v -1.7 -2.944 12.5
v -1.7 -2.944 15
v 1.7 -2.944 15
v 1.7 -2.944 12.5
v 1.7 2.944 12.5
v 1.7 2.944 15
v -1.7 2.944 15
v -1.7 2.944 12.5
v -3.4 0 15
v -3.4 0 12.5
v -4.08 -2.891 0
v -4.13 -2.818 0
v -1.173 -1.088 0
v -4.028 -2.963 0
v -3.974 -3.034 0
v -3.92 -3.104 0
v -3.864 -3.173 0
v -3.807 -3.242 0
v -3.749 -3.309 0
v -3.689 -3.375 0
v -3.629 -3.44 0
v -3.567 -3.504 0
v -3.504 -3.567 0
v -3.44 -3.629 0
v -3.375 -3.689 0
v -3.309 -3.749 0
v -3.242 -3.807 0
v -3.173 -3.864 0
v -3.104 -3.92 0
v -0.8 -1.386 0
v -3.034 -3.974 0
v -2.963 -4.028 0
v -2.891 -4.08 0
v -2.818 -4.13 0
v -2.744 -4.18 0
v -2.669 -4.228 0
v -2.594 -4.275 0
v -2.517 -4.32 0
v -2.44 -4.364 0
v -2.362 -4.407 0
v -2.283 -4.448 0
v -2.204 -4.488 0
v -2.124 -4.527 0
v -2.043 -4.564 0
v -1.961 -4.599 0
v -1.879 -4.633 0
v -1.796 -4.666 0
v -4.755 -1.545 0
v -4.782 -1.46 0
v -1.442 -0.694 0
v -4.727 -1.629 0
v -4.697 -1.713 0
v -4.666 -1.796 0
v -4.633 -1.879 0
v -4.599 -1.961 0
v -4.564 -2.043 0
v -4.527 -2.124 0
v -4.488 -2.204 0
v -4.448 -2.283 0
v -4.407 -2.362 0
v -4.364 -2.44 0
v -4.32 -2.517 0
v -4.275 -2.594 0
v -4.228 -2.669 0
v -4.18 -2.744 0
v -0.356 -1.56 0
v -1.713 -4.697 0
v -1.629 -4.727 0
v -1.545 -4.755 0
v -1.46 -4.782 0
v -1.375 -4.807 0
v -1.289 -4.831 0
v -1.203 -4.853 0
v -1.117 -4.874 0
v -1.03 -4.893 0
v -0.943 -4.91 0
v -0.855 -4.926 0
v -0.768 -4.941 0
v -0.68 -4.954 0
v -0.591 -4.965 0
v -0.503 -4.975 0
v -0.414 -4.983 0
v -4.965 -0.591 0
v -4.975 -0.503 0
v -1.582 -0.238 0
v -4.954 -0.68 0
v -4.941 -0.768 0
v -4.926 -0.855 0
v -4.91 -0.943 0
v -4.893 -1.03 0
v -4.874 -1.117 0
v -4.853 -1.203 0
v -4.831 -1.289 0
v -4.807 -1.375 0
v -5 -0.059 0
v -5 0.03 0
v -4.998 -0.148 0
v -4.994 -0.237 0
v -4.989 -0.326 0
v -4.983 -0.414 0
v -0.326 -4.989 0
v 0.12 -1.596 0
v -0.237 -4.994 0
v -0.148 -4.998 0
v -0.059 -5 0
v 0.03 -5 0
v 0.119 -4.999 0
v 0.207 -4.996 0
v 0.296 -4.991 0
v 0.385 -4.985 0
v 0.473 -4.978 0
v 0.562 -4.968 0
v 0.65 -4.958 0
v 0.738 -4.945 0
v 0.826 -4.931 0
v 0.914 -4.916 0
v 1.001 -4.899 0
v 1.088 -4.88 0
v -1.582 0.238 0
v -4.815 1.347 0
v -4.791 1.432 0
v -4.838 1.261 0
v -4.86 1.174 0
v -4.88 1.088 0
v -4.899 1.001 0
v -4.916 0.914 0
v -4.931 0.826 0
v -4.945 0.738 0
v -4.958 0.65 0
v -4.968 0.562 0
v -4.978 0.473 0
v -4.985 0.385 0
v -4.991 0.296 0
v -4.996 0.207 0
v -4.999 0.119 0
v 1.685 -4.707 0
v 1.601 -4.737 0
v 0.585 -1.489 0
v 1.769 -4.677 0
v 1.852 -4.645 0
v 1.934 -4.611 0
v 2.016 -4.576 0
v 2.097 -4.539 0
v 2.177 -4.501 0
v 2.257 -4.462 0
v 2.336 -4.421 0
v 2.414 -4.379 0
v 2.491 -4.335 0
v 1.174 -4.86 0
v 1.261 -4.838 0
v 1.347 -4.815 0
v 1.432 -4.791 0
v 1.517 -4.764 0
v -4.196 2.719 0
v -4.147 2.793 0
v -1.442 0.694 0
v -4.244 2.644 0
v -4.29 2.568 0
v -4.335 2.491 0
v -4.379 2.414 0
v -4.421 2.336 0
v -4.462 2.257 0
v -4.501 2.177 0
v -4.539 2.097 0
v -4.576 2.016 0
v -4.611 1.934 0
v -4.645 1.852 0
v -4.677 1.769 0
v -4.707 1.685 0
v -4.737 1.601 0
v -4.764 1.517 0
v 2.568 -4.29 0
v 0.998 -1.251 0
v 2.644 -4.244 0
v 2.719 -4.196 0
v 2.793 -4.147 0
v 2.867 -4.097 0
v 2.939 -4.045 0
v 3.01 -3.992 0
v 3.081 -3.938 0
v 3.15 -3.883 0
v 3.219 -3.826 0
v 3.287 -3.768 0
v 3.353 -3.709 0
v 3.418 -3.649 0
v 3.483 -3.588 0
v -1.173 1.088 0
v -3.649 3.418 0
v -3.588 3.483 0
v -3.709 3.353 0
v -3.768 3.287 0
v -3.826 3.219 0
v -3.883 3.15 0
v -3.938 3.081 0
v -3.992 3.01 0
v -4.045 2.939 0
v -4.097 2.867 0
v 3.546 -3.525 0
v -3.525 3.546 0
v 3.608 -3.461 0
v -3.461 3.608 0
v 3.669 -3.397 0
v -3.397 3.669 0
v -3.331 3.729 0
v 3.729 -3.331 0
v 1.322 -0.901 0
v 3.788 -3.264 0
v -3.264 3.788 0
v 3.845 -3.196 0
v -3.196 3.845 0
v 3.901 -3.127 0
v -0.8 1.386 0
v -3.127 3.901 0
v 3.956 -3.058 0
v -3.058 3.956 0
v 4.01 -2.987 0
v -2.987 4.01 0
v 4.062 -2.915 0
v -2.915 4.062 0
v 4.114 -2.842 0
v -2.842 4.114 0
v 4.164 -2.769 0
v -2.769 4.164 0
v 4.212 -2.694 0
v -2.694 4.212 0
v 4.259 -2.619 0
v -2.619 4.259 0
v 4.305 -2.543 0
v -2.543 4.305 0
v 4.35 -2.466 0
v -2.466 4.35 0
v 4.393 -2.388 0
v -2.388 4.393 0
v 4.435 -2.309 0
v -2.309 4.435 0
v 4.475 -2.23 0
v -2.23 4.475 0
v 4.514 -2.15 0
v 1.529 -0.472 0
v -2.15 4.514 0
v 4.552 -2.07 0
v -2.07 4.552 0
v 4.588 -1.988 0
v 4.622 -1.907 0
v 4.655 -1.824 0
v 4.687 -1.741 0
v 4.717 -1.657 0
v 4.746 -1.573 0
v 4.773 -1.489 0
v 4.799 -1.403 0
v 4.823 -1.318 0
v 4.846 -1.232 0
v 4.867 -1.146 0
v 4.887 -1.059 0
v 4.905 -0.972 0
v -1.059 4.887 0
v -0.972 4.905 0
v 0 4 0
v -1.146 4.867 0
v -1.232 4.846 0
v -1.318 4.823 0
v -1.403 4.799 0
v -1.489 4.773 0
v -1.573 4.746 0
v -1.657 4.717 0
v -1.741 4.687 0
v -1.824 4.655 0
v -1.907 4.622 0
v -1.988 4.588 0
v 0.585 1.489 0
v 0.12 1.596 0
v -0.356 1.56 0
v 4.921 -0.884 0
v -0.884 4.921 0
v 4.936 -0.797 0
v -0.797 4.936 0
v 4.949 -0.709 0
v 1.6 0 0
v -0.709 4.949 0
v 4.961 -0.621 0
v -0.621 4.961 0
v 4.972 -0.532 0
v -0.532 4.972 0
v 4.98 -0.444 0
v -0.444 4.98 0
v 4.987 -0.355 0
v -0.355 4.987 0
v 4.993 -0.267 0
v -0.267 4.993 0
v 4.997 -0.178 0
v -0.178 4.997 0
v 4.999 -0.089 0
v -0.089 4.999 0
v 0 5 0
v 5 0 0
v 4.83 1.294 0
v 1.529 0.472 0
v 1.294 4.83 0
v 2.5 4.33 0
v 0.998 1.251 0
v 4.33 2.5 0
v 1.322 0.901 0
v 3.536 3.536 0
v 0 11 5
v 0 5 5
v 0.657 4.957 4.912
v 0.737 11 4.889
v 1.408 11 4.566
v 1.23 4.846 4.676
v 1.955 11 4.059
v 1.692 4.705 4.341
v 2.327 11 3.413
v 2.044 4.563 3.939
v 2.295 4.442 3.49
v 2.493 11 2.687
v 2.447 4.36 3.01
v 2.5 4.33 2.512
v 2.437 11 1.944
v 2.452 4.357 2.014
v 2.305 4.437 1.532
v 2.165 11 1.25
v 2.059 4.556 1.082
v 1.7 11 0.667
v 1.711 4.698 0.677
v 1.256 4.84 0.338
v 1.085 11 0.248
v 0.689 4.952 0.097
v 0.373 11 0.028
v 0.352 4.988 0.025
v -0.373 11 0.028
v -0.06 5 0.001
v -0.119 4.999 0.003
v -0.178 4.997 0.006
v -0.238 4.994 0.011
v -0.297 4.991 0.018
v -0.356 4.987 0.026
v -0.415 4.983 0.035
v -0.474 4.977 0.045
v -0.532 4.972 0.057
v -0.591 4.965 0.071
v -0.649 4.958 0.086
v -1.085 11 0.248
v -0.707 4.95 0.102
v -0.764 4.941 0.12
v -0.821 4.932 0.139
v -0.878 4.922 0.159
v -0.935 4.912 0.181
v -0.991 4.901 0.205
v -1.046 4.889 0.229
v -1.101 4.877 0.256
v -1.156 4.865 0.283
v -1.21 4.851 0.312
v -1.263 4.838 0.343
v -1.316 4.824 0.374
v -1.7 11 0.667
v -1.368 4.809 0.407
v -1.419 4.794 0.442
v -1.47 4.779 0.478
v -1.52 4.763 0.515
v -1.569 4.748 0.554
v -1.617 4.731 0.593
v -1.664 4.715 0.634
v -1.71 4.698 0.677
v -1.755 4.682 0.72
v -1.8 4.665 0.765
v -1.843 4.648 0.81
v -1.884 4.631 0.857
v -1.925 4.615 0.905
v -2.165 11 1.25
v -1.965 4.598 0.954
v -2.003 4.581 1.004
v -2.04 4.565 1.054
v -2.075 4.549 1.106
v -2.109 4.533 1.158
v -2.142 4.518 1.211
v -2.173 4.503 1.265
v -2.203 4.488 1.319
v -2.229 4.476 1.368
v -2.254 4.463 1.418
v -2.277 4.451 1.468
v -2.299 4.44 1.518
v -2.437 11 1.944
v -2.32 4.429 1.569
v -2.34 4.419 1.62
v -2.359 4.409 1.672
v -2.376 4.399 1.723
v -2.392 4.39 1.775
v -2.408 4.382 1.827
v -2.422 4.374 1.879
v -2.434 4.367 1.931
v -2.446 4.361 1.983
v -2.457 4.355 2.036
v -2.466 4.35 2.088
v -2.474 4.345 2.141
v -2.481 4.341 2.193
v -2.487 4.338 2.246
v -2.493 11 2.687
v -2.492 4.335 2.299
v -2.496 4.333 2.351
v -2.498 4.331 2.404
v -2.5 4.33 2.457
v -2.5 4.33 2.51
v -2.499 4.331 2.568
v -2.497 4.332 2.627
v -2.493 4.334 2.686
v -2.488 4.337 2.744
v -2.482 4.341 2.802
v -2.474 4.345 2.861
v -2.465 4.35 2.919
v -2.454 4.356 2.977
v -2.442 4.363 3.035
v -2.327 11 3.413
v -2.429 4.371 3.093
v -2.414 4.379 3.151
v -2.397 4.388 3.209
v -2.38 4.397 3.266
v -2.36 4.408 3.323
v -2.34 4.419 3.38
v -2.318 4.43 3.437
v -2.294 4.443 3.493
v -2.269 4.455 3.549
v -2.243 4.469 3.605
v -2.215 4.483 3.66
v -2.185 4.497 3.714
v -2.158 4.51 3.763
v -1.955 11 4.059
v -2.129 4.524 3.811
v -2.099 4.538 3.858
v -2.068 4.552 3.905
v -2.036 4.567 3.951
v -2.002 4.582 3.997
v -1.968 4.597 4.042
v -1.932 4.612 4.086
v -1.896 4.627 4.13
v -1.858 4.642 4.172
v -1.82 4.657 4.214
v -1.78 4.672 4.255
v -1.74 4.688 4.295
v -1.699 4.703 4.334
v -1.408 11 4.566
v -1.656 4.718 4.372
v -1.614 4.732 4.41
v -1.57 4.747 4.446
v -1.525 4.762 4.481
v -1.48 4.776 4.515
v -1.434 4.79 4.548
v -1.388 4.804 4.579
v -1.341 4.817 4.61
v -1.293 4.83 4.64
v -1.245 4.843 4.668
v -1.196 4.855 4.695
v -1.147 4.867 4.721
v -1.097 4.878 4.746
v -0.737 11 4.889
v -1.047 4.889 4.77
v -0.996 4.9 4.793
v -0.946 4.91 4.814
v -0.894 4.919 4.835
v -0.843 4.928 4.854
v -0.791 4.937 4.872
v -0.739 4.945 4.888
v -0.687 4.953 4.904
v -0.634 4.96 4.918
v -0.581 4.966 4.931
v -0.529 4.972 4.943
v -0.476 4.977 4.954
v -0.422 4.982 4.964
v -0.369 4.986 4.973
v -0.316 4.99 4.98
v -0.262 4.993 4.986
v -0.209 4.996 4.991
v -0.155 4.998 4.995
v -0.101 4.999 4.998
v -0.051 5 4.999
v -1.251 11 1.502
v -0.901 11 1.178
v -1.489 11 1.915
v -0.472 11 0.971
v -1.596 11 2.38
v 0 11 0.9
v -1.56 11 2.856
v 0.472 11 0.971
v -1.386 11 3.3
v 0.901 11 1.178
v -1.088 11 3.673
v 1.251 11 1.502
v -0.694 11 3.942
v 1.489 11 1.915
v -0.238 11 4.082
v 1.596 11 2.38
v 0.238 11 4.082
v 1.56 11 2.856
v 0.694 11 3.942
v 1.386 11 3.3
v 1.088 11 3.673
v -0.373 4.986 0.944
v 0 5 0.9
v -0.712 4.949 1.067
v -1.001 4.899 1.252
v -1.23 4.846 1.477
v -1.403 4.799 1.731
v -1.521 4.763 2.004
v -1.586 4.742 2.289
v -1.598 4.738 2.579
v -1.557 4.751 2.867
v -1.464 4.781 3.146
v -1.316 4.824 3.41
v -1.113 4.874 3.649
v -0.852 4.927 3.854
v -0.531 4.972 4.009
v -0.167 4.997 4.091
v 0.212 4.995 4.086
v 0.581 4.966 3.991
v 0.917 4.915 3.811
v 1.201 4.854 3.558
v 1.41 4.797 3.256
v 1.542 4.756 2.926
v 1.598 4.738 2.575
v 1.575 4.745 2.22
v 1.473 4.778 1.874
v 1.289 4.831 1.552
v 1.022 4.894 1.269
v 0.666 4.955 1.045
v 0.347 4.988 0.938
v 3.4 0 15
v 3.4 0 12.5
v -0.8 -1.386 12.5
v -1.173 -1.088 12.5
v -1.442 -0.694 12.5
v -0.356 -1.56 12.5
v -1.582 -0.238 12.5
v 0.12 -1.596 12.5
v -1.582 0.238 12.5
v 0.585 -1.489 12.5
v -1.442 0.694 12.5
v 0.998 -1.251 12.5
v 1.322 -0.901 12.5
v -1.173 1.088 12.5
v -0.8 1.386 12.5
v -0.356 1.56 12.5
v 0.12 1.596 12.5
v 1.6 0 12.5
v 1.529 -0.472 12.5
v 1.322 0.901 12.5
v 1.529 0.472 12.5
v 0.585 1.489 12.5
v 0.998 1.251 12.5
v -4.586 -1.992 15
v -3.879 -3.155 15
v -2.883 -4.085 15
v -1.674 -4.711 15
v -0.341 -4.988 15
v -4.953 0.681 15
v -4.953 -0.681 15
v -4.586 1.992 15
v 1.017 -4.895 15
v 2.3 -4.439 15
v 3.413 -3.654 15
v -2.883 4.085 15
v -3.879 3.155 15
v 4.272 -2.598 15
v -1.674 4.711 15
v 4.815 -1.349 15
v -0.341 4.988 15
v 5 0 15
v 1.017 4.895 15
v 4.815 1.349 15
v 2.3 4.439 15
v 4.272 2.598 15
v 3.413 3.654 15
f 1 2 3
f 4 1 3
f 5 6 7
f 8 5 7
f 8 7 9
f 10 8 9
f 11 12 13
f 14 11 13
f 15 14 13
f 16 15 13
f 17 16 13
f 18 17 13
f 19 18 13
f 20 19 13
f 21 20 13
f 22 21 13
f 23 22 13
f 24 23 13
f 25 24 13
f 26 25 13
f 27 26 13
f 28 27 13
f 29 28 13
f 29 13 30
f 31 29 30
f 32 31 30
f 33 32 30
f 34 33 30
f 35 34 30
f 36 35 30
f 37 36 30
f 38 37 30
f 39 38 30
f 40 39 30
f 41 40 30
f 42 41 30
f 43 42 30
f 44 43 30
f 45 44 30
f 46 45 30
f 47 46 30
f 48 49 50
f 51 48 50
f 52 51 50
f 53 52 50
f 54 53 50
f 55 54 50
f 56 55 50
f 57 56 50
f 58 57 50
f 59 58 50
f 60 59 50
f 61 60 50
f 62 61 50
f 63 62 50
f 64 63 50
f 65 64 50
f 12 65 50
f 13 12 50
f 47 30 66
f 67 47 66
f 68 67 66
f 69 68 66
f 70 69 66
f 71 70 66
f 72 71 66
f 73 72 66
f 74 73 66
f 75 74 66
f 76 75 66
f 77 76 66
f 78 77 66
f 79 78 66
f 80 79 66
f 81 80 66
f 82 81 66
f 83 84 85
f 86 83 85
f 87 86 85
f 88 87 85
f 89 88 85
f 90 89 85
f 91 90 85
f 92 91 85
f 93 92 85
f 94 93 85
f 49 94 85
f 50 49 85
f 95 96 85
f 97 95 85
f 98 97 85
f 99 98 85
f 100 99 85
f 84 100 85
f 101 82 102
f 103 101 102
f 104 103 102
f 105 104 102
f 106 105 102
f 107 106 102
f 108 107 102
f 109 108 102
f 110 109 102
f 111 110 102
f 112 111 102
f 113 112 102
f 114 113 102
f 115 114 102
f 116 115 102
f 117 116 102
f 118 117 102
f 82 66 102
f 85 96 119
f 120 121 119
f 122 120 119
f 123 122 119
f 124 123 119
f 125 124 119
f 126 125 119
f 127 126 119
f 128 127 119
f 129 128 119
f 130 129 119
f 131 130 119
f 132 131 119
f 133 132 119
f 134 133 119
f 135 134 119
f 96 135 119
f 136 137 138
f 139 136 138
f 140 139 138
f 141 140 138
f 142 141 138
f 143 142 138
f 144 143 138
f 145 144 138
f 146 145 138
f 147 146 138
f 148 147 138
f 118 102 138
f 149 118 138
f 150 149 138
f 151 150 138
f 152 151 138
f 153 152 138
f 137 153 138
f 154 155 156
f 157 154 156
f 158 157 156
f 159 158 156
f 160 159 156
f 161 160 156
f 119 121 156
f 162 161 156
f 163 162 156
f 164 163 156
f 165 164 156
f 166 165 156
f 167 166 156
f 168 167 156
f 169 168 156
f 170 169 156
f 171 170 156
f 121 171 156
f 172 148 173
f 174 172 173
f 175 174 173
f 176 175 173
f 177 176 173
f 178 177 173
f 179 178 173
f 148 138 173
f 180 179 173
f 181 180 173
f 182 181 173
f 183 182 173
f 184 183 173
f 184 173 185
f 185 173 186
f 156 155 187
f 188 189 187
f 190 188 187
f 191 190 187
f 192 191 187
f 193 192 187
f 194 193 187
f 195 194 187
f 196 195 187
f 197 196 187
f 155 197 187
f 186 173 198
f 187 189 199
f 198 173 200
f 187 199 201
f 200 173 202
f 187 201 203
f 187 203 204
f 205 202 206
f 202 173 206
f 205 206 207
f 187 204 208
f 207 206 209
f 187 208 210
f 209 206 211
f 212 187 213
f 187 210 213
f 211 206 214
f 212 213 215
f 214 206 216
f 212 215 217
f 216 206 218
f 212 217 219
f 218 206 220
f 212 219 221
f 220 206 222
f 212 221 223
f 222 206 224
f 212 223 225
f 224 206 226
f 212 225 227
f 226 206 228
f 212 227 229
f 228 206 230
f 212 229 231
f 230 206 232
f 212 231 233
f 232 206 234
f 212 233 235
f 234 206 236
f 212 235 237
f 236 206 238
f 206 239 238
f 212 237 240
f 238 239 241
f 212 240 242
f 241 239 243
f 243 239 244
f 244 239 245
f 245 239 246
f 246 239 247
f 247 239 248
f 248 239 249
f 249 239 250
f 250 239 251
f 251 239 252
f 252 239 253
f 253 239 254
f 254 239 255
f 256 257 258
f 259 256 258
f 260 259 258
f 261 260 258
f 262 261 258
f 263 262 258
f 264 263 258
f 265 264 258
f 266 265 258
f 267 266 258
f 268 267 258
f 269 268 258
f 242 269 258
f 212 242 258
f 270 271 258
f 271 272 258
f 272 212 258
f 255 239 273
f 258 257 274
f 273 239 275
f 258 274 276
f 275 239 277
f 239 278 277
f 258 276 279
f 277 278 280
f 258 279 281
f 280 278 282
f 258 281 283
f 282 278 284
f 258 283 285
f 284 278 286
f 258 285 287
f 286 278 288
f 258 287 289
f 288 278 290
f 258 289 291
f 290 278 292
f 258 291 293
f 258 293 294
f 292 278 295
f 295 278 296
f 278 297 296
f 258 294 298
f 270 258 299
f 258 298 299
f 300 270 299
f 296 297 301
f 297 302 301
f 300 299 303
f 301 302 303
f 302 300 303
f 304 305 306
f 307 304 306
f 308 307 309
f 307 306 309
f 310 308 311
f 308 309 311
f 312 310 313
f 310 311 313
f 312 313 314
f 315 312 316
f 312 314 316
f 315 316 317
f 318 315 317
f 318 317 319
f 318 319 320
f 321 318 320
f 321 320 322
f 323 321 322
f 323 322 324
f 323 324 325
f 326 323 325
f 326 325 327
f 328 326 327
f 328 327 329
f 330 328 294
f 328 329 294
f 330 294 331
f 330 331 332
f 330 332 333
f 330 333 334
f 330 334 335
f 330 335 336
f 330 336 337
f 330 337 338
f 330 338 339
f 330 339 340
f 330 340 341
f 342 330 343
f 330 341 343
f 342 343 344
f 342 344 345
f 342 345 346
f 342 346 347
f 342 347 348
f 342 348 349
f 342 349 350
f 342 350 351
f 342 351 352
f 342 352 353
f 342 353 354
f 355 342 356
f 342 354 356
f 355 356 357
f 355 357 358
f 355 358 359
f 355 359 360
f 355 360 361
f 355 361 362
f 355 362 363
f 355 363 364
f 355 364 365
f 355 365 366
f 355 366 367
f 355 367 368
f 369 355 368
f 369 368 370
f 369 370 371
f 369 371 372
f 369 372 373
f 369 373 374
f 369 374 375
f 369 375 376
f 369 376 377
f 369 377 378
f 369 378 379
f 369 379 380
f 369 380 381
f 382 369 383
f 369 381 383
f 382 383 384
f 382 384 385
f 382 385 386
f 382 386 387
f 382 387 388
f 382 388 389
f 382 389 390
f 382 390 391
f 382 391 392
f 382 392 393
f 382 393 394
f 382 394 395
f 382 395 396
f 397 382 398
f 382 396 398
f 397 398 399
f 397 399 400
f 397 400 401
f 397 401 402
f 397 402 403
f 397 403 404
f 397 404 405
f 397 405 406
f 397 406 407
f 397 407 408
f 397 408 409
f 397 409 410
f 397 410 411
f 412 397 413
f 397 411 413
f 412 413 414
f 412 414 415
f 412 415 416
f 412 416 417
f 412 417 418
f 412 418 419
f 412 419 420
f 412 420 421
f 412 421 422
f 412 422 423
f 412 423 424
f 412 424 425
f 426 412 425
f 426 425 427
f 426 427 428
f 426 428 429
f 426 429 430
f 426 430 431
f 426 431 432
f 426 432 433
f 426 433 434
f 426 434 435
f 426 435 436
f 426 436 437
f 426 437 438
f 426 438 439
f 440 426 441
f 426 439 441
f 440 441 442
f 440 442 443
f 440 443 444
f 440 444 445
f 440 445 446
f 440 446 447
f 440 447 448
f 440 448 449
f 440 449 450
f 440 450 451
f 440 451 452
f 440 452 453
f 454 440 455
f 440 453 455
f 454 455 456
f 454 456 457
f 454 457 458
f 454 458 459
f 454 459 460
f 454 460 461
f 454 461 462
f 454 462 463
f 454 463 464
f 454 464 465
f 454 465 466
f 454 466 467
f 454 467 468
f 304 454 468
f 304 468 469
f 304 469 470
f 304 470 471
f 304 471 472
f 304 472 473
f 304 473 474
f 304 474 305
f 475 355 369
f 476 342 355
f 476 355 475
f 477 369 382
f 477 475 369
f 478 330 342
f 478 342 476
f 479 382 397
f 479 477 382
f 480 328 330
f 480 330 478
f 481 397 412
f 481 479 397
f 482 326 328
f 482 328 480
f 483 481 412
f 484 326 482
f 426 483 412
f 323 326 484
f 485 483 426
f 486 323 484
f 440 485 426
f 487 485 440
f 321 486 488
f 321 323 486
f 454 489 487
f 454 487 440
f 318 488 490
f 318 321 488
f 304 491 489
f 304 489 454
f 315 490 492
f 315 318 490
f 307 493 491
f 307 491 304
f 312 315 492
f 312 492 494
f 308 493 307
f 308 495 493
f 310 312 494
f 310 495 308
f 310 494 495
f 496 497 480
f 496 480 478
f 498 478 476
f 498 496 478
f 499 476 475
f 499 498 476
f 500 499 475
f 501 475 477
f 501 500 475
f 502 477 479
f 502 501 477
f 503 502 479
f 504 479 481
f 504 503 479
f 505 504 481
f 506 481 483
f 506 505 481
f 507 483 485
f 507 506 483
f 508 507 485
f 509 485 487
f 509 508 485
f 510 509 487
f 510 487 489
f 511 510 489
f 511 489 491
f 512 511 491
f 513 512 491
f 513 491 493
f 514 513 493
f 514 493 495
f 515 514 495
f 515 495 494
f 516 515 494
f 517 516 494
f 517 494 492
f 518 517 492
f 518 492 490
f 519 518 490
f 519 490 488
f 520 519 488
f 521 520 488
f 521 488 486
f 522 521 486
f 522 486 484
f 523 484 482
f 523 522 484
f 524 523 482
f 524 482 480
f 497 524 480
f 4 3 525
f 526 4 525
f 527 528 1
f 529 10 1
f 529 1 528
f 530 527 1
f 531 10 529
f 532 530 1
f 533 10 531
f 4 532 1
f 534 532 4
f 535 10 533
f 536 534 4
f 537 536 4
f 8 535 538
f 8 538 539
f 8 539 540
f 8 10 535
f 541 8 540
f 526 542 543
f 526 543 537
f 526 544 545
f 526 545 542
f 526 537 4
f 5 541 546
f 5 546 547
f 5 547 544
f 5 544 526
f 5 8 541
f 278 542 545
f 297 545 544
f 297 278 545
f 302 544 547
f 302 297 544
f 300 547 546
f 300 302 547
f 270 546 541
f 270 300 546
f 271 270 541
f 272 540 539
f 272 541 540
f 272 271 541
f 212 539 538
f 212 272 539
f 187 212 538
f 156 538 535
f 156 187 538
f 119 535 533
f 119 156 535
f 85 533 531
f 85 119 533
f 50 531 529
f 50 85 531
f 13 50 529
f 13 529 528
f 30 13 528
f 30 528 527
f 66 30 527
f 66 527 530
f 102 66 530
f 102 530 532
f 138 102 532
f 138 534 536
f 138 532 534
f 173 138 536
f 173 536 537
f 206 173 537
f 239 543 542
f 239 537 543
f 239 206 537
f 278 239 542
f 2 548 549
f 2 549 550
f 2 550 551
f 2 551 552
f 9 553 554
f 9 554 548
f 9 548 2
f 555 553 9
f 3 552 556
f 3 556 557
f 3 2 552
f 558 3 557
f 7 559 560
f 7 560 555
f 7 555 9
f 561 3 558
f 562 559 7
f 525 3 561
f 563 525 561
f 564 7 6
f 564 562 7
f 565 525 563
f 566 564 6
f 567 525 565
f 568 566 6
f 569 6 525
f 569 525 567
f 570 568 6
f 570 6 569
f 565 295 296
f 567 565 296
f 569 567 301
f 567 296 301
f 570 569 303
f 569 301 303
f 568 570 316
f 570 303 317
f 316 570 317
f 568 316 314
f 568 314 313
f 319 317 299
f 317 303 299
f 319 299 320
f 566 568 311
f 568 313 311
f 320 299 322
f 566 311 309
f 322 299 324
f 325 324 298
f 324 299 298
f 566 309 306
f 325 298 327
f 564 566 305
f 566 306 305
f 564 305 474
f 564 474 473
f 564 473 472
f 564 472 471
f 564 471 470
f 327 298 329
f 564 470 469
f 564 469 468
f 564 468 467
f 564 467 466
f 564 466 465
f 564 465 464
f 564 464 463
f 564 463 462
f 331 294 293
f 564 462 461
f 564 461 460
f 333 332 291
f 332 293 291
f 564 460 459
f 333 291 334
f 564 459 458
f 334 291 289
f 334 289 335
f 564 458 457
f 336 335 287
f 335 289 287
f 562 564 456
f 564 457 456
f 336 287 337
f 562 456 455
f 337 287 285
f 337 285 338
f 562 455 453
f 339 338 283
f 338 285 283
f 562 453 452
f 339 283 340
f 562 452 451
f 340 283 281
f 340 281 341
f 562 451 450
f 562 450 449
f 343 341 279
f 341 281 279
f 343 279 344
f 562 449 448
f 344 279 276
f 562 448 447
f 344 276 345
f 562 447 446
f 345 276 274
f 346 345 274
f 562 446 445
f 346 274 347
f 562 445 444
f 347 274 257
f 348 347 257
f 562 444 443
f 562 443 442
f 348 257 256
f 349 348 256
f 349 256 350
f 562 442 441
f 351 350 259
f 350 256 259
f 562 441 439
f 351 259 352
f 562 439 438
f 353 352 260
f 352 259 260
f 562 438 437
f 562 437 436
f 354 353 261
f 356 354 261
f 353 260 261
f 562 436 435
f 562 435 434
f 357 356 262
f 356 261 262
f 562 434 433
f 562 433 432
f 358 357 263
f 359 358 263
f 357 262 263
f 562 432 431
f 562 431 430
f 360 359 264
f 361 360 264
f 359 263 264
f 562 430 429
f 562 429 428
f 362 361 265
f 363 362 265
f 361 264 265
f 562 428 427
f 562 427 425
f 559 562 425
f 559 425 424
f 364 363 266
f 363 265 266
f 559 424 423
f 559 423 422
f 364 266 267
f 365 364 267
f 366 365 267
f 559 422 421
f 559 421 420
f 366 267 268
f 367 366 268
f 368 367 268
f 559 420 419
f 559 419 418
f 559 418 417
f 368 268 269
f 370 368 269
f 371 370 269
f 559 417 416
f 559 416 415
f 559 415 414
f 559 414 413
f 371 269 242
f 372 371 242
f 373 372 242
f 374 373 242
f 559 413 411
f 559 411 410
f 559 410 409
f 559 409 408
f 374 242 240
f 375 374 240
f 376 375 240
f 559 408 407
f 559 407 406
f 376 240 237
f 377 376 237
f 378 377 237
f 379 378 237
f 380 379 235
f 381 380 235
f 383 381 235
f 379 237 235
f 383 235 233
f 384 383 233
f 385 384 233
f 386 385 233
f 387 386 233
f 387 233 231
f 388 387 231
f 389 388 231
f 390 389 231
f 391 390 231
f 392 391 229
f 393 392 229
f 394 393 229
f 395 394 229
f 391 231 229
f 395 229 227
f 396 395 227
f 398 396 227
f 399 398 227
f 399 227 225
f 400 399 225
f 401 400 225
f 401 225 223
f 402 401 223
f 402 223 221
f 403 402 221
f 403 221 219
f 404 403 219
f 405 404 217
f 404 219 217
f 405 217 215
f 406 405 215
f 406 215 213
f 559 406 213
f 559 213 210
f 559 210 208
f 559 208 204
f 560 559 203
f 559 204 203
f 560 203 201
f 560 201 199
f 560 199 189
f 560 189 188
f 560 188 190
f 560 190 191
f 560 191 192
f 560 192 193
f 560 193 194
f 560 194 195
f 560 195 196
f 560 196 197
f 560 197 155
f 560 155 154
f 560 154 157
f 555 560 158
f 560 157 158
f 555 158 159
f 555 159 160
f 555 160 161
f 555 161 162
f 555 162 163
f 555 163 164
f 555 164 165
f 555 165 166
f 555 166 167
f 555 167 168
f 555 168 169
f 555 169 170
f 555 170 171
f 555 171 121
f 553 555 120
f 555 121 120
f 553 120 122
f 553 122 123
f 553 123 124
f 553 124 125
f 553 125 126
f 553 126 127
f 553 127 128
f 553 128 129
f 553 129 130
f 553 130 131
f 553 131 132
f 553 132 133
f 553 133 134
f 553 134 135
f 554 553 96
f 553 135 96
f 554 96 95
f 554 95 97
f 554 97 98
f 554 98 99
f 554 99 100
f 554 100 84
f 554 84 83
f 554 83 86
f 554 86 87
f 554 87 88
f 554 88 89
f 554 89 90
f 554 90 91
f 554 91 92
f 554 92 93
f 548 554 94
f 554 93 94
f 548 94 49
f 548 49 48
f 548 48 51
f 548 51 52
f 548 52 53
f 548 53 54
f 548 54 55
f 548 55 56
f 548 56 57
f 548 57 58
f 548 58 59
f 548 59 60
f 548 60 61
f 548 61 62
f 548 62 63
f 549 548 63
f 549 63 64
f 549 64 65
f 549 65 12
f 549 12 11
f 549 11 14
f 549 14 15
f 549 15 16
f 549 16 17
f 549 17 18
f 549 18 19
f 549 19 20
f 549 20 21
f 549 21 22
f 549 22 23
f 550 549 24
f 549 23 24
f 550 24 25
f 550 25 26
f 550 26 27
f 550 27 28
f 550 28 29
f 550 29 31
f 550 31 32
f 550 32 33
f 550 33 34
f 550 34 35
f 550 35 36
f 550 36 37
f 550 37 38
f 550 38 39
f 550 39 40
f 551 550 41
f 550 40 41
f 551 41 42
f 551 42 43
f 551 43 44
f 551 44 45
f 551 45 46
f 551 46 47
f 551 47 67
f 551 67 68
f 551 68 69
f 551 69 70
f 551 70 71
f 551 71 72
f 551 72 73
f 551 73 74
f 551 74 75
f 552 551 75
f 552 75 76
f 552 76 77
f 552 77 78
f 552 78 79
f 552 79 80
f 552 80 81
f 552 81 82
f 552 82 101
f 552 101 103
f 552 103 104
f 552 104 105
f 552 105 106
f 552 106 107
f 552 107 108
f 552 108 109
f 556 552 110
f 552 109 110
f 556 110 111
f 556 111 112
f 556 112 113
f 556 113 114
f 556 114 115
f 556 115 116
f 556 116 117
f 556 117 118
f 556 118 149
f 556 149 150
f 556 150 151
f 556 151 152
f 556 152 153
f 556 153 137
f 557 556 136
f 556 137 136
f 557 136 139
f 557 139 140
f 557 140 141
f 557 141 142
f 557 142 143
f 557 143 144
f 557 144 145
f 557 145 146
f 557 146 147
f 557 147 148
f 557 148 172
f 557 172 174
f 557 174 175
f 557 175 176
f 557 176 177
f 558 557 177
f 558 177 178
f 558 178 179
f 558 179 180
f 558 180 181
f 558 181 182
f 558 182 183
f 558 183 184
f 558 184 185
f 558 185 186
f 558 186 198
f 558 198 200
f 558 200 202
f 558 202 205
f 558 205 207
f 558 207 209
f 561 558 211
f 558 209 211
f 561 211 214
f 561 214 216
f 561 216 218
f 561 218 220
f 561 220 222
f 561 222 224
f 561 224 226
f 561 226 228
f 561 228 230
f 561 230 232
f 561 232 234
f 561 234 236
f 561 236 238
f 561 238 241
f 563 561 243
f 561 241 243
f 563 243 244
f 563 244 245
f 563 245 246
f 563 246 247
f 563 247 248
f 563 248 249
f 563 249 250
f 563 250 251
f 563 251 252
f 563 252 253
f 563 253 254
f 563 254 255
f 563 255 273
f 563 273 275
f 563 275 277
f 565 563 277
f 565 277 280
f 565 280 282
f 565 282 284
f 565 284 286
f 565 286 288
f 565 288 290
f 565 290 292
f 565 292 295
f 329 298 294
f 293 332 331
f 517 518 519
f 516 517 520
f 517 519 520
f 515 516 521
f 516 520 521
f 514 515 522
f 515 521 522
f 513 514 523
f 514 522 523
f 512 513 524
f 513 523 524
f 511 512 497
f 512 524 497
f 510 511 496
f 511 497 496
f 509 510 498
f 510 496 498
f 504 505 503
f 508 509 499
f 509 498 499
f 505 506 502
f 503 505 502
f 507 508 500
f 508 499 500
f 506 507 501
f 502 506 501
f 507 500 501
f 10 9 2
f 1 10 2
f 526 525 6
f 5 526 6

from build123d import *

# Parameters (mm, degrees)
SKETCH_1_R          = 5
SKETCH_1_R_2        = 1.6
EXTRUDE_1_DEPTH     = 15
CUT_EXTRUDE_1_DEPTH = 2.5
SKETCH_4_R          = 2.5
SKETCH_4_R_2        = 1.6
EXTRUDE_2_DEPTH     = 7


with BuildPart() as part:
    # 草图1 → 凸台-拉伸1 (new body)
    with BuildSketch(Plane.XY):
        Circle(SKETCH_1_R)
        Circle(SKETCH_1_R_2, mode=Mode.SUBTRACT)
    extrude(amount=EXTRUDE_1_DEPTH)

    # 草图2 → 切除-拉伸1 (cut)
    with BuildSketch(Plane.XY.offset(15)):
        Polygon((3.4, 0), (1.7, 2.944486373), (-1.7, 2.944486373), (-3.4, 0), (-1.7, -2.944486373), (1.7, -2.944486373), align=None)
    extrude(amount=-CUT_EXTRUDE_1_DEPTH, mode=Mode.SUBTRACT)

    # 草图4 → 凸台-拉伸2 (add)
    with BuildSketch(Plane(origin=(0, 4, 0), x_dir=(1, 0, 0), z_dir=(0, 1, 0))):
        with Locations(Location((0, -2.5, 0), (0, 0, 270))):
            Circle(SKETCH_4_R)
        with Locations(Location((0, -2.5, 0), (0, 0, 90))):
            Circle(SKETCH_4_R_2, mode=Mode.SUBTRACT)
    extrude(amount=EXTRUDE_2_DEPTH)


solid = part.part
